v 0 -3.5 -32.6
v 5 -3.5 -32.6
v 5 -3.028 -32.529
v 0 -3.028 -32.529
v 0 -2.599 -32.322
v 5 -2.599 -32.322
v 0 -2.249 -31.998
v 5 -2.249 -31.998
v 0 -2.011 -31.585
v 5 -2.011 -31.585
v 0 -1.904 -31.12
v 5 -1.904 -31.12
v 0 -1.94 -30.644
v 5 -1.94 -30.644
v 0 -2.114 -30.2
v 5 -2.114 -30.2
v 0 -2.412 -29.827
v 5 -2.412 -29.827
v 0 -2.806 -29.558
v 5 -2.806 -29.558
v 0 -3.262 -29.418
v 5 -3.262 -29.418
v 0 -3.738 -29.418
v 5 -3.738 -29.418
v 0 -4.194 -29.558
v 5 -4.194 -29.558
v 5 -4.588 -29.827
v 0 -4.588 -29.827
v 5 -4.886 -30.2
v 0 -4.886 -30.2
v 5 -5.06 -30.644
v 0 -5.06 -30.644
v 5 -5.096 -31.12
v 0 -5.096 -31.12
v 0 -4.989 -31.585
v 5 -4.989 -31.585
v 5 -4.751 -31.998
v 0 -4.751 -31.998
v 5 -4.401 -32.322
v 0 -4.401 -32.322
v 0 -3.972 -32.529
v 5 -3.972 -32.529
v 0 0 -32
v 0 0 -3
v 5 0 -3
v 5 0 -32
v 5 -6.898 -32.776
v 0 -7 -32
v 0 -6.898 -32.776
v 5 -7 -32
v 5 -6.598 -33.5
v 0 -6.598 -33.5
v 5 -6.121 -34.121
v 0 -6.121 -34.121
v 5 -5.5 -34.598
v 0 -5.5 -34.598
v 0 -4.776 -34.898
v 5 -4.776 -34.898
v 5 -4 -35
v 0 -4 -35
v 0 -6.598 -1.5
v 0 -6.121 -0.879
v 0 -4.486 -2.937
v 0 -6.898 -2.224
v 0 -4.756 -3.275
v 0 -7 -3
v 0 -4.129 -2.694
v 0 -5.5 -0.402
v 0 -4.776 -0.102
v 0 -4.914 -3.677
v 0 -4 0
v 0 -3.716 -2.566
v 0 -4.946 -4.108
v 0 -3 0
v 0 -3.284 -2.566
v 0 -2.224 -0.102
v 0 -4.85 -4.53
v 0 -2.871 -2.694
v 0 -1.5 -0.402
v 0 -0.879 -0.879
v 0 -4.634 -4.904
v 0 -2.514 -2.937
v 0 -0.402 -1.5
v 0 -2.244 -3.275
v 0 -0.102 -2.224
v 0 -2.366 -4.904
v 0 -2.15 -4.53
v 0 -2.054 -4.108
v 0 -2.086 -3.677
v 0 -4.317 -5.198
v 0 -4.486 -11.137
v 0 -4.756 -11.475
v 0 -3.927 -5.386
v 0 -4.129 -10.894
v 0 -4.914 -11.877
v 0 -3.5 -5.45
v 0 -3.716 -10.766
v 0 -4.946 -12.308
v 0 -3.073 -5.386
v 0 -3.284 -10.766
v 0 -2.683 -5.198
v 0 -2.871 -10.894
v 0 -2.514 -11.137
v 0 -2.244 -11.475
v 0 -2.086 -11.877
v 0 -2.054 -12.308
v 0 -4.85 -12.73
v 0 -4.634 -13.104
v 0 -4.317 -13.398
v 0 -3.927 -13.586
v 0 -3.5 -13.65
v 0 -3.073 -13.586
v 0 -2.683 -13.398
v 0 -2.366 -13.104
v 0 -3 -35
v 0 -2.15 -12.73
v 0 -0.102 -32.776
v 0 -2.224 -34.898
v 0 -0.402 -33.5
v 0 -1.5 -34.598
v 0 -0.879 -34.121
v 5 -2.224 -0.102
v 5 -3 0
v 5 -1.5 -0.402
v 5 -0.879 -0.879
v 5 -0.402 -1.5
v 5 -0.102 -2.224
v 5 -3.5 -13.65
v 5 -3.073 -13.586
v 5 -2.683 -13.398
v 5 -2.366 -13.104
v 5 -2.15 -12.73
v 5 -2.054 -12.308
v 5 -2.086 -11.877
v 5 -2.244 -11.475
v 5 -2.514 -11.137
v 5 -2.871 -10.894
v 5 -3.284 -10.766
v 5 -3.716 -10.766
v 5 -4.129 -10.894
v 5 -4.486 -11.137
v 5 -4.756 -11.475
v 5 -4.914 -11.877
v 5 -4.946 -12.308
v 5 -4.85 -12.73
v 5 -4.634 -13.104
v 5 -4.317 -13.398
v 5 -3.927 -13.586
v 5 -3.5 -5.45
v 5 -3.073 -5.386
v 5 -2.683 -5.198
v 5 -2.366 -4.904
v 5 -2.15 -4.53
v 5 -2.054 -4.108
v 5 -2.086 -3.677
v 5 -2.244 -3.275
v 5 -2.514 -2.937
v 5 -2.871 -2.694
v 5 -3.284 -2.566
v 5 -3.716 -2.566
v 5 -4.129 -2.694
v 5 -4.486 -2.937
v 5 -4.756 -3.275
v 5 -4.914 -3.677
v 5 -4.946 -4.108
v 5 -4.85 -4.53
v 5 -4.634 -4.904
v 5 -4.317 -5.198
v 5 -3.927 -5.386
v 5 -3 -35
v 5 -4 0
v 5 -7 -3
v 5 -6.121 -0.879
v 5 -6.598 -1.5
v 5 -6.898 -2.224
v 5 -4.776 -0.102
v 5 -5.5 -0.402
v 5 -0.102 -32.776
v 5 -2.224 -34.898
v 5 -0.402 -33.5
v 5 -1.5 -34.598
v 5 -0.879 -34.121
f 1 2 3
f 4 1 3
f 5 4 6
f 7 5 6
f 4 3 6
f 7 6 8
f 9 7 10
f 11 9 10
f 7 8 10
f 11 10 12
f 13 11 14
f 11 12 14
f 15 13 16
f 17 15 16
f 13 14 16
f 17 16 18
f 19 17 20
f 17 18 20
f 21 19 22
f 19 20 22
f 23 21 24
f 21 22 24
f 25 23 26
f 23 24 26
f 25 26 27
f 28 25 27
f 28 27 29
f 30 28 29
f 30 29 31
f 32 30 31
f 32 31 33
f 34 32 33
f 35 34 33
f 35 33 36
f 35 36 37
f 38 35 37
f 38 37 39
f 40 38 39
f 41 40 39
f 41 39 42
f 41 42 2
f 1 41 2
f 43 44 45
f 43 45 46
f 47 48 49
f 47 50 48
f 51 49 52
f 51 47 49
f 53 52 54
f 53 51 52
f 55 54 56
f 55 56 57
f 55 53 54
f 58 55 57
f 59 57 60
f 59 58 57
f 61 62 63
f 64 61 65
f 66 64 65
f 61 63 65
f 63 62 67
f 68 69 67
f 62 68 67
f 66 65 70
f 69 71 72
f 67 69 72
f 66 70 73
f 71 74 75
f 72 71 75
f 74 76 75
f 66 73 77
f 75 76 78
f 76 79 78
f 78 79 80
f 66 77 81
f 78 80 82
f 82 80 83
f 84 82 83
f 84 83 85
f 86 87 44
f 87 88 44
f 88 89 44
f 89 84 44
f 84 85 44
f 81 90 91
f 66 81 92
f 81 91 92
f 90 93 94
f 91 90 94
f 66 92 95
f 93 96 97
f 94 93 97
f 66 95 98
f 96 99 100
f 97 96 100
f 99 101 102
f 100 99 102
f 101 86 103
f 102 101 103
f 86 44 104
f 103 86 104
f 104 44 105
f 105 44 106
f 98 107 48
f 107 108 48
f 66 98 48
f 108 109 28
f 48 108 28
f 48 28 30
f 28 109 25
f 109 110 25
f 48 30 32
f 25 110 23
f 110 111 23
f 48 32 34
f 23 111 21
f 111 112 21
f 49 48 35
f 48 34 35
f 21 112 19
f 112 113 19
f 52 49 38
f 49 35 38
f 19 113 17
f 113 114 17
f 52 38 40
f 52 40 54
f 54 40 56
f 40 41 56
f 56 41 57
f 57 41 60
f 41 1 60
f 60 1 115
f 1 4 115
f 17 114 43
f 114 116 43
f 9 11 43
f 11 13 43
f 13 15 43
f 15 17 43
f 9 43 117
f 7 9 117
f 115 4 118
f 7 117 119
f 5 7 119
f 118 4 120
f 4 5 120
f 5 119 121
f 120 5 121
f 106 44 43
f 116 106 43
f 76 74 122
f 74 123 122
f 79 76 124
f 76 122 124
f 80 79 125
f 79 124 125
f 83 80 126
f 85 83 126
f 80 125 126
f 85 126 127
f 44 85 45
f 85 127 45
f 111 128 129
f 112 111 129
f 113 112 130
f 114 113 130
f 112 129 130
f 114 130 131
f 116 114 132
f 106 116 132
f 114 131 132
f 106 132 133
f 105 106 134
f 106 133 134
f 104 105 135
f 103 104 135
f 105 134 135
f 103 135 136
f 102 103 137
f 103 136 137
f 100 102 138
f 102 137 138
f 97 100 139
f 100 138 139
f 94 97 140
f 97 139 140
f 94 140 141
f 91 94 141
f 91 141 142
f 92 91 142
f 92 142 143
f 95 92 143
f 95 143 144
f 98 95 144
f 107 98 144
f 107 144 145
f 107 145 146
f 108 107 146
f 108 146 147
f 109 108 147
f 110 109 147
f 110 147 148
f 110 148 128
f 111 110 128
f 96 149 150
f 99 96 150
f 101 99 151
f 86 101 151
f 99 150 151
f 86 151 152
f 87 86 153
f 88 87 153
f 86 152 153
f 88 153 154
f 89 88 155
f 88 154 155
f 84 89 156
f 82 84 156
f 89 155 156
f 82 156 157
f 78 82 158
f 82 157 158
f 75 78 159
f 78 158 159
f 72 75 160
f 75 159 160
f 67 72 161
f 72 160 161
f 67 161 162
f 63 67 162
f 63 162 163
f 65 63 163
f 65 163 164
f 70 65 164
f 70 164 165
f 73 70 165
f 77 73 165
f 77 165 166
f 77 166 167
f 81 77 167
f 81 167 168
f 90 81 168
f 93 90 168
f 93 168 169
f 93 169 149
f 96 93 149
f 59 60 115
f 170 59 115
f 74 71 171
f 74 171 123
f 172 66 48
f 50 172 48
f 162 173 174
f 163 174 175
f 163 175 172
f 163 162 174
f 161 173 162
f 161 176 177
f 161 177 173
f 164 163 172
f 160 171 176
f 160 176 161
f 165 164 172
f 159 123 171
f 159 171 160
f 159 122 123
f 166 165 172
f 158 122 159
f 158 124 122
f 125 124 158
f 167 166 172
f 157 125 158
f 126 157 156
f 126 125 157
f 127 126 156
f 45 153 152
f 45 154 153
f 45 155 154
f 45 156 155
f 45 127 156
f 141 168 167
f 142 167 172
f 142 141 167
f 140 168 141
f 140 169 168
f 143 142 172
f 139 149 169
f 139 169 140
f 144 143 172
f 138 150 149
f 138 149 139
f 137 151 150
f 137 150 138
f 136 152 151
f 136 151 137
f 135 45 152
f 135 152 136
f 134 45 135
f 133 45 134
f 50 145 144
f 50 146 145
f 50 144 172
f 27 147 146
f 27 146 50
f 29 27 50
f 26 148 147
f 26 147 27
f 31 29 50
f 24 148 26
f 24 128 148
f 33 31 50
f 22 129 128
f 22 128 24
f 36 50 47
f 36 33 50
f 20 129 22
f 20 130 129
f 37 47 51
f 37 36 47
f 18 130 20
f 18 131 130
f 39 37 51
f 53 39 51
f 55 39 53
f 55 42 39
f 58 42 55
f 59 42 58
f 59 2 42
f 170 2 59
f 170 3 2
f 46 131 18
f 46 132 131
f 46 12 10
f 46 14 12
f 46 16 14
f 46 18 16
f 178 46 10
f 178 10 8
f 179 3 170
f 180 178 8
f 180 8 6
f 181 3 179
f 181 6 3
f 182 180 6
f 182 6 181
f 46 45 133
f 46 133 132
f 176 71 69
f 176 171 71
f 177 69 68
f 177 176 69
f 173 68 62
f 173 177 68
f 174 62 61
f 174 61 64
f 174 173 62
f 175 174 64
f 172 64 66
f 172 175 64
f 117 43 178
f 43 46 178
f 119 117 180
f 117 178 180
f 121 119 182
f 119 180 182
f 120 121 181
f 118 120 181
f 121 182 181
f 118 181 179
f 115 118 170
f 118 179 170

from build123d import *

# Parameters (mm, degrees)
SKETCH1_W           = 35
SKETCH1_H           = 7
BOSS_EXTRUDE1_DEPTH = 5
SKETCH2_R           = 1.45
SKETCH2_R_2         = 1.6
CUT_EXTRUDE1_DEPTH  = 37.041642582
FILLET1_R           = 3


with BuildPart() as part:
    # Sketch1 → Boss-Extrude1 (new body)
    with BuildSketch(Plane(origin=(0, 0, 0), x_dir=(0, 0, -1), z_dir=(1, 0, 0))):
        with Locations((17.5, -3.5)):
            Rectangle(SKETCH1_W, SKETCH1_H)
    extrude(amount=BOSS_EXTRUDE1_DEPTH)

    # Sketch2 → Cut-Extrude1 (cut, through all)
    with BuildSketch(Plane(origin=(5, 0, 0), x_dir=(0, 0, -1), z_dir=(1, 0, 0))):
        with Locations((4, -3.5)):
            Circle(SKETCH2_R)
        with Locations((12.2, -3.5)):
            Circle(SKETCH2_R)
        with Locations((31, -3.5)):
            Circle(SKETCH2_R_2)
    extrude(amount=-CUT_EXTRUDE1_DEPTH, mode=Mode.SUBTRACT)

    # Fillet1
    fillet1_edges = [part.edges().sort_by_distance(p)[0] for p in [
        (2.5, 0, 0),
        (2.5, 0, -35),
        (2.5, -7, -35),
        (2.5, -7, 0),
    ]]
    fillet(fillet1_edges, radius=FILLET1_R)


solid = part.part
